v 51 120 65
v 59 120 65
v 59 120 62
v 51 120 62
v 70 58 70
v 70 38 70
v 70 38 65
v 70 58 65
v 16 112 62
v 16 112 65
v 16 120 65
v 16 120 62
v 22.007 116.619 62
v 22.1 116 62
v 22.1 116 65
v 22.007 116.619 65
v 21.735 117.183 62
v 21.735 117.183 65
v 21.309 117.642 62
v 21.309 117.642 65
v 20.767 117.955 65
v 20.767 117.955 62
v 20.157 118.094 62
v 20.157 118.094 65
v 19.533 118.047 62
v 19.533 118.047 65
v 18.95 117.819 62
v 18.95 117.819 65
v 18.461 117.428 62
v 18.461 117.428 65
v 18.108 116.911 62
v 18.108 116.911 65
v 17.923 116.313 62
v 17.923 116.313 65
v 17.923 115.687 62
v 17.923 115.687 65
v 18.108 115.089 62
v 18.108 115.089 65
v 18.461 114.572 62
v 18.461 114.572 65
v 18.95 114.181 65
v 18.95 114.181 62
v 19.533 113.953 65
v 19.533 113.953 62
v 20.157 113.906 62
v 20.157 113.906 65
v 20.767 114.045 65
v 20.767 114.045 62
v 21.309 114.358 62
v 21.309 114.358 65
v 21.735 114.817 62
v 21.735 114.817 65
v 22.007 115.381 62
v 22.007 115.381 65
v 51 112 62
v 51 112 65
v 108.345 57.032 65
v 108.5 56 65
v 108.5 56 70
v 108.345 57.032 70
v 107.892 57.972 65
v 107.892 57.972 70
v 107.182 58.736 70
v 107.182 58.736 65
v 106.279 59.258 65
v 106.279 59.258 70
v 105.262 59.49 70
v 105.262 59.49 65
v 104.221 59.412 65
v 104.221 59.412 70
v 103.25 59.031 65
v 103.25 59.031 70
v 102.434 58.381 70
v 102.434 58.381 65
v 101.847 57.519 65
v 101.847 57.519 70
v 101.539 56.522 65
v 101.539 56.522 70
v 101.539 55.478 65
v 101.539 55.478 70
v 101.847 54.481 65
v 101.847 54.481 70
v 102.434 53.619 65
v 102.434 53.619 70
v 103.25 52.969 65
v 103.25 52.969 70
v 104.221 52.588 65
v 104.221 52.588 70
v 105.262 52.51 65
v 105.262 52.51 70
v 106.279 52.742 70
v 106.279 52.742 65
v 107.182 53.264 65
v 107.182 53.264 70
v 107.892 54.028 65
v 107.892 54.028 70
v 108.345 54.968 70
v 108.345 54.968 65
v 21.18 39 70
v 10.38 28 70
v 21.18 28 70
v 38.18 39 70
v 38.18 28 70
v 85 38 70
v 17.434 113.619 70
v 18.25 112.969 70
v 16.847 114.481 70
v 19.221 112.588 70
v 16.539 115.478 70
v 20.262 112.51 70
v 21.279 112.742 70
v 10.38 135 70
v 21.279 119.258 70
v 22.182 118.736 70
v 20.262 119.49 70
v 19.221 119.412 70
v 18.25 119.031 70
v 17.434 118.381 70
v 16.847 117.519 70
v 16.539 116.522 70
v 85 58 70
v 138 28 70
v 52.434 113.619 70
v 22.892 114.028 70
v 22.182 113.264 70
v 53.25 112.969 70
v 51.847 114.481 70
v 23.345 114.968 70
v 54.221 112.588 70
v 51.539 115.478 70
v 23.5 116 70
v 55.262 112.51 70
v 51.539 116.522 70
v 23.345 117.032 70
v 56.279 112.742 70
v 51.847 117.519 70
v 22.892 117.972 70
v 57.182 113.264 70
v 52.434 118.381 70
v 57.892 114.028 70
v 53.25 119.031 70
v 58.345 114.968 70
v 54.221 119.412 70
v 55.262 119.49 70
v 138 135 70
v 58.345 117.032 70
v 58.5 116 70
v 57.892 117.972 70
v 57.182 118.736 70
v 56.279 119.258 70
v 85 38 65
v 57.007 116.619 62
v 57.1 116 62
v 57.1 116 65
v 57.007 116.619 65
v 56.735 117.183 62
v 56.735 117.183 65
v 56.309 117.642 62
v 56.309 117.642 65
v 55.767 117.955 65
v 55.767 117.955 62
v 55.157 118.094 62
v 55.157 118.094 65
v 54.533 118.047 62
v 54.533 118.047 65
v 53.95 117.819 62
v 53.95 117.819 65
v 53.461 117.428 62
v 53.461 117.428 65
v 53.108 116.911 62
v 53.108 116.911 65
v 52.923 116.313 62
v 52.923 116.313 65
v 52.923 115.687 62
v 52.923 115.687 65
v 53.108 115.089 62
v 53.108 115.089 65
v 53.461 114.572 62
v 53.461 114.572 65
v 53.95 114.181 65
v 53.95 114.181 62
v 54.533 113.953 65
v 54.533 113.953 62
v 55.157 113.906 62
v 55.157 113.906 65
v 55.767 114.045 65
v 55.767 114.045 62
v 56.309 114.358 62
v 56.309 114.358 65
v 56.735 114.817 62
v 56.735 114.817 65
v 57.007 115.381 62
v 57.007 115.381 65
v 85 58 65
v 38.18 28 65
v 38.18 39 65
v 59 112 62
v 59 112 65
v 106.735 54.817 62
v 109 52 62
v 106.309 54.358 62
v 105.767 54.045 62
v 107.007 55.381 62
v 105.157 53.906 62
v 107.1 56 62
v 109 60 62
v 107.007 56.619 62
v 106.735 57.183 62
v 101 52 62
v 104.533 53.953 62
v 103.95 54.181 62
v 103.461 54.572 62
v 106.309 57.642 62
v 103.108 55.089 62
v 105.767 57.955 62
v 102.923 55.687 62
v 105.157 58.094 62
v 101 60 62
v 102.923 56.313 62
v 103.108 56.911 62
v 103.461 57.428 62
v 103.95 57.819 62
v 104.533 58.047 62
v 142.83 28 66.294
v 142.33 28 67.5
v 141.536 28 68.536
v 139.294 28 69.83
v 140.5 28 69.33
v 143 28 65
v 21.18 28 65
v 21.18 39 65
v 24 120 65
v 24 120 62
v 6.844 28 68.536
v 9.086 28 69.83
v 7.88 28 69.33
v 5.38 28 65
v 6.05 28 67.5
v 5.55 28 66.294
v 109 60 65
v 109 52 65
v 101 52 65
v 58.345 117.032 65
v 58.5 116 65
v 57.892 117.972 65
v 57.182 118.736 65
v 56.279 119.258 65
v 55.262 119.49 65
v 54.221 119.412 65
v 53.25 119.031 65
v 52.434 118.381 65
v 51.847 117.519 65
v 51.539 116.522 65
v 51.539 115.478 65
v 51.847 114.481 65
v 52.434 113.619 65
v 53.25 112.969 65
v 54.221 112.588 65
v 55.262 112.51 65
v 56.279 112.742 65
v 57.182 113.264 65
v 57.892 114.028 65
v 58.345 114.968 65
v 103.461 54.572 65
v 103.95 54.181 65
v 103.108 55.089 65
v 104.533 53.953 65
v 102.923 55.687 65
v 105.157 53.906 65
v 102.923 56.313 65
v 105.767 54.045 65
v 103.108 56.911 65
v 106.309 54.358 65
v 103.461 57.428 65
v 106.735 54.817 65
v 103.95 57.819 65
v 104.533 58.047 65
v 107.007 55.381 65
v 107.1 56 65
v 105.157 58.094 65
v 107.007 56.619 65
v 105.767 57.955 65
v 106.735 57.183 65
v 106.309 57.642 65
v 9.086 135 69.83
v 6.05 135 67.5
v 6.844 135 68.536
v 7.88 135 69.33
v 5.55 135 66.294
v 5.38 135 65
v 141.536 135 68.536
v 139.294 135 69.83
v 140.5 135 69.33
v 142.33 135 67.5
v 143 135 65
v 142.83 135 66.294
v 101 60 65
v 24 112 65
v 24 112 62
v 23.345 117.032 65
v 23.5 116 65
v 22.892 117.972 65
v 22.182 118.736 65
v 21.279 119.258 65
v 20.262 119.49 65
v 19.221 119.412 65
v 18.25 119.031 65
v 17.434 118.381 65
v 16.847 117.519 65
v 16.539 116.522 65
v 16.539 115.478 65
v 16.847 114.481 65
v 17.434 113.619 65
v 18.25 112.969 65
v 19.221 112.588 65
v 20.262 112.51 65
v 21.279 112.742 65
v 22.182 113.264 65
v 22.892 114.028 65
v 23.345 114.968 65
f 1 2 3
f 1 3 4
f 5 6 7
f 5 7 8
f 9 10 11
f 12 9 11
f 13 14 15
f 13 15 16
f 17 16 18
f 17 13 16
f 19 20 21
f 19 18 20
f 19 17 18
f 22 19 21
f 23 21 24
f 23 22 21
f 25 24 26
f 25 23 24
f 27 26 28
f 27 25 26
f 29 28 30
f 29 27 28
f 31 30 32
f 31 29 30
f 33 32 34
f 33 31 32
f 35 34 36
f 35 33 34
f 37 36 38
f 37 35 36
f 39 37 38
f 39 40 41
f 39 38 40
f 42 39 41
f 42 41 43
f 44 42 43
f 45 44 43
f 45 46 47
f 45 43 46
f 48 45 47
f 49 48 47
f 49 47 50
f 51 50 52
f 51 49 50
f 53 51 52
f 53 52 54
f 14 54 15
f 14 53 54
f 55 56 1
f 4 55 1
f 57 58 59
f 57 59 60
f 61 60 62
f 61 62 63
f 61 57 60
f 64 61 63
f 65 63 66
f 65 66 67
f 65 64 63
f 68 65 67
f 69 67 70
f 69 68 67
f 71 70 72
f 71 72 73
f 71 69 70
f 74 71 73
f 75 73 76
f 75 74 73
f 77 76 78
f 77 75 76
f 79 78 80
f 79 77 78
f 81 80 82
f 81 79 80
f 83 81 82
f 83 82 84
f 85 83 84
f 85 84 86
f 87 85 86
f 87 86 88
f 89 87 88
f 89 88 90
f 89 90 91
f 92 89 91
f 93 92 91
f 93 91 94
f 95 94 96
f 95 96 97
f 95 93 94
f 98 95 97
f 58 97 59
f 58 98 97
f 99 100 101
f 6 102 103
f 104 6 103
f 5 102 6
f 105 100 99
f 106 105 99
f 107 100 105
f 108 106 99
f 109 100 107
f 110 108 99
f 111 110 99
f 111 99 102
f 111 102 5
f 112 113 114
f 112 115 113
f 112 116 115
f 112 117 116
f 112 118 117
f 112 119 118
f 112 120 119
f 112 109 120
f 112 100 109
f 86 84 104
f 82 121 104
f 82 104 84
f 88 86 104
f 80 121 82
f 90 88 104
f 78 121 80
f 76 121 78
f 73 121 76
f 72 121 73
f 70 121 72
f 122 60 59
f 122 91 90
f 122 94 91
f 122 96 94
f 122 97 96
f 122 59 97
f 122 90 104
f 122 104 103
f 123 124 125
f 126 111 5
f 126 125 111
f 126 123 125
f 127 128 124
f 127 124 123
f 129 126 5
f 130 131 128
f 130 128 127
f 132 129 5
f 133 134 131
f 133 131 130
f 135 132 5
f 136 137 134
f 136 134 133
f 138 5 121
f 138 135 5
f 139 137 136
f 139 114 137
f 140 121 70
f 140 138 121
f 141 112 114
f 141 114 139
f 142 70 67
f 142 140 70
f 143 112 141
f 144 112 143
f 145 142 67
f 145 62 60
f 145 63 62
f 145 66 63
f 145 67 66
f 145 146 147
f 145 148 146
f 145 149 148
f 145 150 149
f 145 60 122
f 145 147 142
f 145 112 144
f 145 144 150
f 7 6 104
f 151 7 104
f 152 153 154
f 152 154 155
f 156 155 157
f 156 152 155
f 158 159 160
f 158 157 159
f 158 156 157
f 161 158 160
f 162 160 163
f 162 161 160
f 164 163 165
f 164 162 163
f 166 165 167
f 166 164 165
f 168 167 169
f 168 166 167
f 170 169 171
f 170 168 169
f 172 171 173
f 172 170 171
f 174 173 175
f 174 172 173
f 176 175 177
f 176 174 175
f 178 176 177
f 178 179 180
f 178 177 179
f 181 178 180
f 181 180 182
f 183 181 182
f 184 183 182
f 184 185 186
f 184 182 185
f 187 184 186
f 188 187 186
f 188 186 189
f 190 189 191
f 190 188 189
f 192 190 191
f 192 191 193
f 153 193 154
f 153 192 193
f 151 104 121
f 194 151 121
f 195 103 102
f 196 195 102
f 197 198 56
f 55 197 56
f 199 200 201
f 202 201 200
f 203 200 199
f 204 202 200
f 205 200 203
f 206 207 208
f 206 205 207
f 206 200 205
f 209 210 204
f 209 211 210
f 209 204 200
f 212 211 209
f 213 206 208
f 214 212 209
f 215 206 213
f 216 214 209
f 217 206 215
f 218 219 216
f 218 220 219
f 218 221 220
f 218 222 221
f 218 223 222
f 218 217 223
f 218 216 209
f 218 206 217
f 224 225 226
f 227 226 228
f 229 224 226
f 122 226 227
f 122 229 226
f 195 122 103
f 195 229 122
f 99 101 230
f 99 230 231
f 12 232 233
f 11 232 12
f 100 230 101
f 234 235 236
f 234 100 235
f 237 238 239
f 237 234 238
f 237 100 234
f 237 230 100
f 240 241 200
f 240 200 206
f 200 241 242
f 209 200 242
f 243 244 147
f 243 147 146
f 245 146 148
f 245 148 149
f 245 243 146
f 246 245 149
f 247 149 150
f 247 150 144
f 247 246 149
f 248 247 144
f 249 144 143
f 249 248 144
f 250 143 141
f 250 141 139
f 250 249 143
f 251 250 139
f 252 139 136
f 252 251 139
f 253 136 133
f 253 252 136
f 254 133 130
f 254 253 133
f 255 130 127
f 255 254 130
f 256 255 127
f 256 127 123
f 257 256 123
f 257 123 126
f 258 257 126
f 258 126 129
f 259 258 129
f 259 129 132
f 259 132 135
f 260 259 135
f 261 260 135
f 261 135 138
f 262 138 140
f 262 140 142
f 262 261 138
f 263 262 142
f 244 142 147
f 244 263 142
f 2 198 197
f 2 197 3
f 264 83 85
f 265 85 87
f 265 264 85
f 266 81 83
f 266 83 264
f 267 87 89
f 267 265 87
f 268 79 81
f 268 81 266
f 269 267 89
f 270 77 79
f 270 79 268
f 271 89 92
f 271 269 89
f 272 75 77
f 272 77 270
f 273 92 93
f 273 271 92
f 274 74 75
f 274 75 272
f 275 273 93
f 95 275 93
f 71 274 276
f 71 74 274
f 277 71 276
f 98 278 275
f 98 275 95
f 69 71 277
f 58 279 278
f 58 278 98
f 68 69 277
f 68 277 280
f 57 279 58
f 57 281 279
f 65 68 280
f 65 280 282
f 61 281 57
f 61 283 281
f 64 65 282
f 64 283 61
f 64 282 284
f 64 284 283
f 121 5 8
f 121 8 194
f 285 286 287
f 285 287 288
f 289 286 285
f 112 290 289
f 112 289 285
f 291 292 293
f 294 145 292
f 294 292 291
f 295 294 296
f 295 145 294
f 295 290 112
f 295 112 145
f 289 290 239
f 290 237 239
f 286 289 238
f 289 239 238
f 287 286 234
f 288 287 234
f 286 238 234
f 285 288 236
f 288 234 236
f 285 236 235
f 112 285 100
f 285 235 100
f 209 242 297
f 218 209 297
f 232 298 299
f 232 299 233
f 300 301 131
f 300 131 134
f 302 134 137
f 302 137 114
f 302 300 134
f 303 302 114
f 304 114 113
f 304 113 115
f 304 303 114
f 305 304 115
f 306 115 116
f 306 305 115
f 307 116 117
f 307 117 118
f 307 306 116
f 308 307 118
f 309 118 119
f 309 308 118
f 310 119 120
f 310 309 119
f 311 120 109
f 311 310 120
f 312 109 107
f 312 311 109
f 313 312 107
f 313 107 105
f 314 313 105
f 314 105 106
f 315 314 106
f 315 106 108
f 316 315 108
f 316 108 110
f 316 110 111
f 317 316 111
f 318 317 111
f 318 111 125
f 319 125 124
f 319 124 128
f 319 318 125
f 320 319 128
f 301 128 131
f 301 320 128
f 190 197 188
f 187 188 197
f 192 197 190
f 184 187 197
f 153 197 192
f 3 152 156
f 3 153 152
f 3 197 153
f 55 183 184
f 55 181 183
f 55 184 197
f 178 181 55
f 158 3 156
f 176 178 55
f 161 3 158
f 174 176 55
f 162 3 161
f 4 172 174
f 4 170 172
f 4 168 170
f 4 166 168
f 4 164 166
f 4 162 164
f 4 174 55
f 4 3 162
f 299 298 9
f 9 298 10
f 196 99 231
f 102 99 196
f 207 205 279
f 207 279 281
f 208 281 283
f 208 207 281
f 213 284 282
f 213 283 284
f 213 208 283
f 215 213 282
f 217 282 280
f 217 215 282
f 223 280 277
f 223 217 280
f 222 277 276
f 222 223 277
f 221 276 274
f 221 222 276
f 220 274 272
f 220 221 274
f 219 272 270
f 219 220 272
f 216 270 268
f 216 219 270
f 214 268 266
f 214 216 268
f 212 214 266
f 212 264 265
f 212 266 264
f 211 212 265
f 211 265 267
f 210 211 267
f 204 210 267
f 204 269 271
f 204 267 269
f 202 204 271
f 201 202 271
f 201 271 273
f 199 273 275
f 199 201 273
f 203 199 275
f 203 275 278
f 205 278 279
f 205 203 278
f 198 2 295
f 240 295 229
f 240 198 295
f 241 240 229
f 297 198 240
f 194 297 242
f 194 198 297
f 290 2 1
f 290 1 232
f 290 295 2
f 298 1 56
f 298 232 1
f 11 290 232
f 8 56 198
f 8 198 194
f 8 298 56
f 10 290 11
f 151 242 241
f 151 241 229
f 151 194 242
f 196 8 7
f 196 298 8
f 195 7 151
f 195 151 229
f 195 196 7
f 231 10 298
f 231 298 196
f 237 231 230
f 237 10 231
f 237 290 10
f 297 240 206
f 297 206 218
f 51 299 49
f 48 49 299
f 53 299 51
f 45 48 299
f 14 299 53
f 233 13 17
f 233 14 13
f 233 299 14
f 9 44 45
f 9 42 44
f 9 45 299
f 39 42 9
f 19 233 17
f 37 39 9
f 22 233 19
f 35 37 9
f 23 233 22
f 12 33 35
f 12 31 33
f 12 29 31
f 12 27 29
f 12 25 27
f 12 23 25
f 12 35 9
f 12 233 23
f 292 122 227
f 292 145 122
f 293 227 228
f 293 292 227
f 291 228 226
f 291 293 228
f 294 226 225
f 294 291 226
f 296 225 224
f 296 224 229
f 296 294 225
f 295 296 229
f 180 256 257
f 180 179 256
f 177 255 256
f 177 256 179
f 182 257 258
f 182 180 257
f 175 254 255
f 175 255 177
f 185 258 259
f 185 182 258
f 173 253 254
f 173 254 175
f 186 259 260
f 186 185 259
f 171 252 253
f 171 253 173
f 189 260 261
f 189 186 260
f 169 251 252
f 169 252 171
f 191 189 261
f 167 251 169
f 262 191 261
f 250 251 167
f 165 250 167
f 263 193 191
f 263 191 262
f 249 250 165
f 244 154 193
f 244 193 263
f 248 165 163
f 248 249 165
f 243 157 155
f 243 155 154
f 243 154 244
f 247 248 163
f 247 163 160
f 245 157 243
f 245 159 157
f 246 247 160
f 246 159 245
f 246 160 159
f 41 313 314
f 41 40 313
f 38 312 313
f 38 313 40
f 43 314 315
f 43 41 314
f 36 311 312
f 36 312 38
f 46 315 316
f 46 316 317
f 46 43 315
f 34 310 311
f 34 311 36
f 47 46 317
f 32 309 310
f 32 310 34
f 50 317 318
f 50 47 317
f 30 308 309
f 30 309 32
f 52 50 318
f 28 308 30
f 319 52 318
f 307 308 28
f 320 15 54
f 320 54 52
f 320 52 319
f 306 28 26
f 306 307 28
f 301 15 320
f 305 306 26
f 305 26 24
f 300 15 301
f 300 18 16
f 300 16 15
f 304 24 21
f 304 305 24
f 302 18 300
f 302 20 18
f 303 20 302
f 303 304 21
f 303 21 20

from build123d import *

# Parameters (mm, degrees)
SKETCH1_W                = 150
SKETCH1_H                = 135
SKETCH1_R                = 2.1
BOSS_EXTRUDE2_DEPTH      = 70
SKETCH13_W               = 166.167800453
SKETCH13_H               = 148.934240363
CUT_EXTRUDE1_DEPTH       = 60
SKETCH17_W               = 17
SKETCH17_H               = 11
SKETCH17_W_2             = 15
SKETCH17_H_2             = 20
CUT_EXTRUDE5_DEPTH       = 10
CUT_EXTRUDE6_DEPTH       = 203.051973512
CUT_EXTRUDE6_DEPTH_BACK  = 203.051973512
SKETCH18_W               = 150
SKETCH18_H               = 135
CUT_EXTRUDE7_DEPTH       = 206.095744471
CUT_EXTRUDE7_DEPTH_BACK  = 206.095744471
FILLET1_R                = 5
SKETCH20_W               = 8
SKETCH20_H               = 8
BOSS_EXTRUDE3_DEPTH      = 3
CUT_EXTRUDE9_START       = -5
SKETCH21_R               = 3.5
SKETCH21_R_2             = 2.1
CUT_EXTRUDE9_DEPTH       = 5
CUT_EXTRUDE10_DEPTH      = 197.81971446
CUT_EXTRUDE10_DEPTH_BACK = 197.81971446
SKETCH21_2_R             = 2.1


with BuildPart() as part:
    # Sketch1 → Boss-Extrude2 (new body)
    with BuildSketch(Plane.XY):
        with Locations((75, 67.5)):
            Rectangle(SKETCH1_W, SKETCH1_H)
        with Locations((20, 116)):
            Circle(SKETCH1_R, mode=Mode.SUBTRACT)
        with Locations((55, 116)):
            Circle(SKETCH1_R, mode=Mode.SUBTRACT)
        with Locations((105, 56)):
            Circle(SKETCH1_R, mode=Mode.SUBTRACT)
    extrude(amount=BOSS_EXTRUDE2_DEPTH)

    # Sketch13 → Cut-Extrude1 (cut)
    with BuildSketch(Plane(origin=(0, 0, 0), x_dir=(-1, 0, 0), z_dir=(0, 0, -1))):
        with Locations((-76.451247165, 67.95351474)):
            Rectangle(SKETCH13_W, SKETCH13_H)
    extrude(amount=-CUT_EXTRUDE1_DEPTH, mode=Mode.SUBTRACT)

    # Sketch17 → Cut-Extrude5 (cut)
    with BuildSketch(Plane.XY.offset(70)):
        with Locations((29.68, 33.5)):
            Rectangle(SKETCH17_W, SKETCH17_H)
        with Locations((77.5, 48)):
            Rectangle(SKETCH17_W_2, SKETCH17_H_2)
    extrude(amount=-CUT_EXTRUDE5_DEPTH, mode=Mode.SUBTRACT)

    # Sketch18 → Cut-Extrude6 (cut, two sides: drawn at the far end of the back side and taken through both)
    # profile 1 of 2: a face of its own
    with BuildSketch(Plane.XY.offset(70).offset(-CUT_EXTRUDE6_DEPTH_BACK)):
        Polygon((-16.428571429, -29.414285714), (-20.085714286, 157.1), (193.857142857, 157.1), (193.857142857, -29.414285714), align=None)
        with Locations((75, 67.5)):
            Rectangle(SKETCH18_W, SKETCH18_H, mode=Mode.SUBTRACT)
    # profile 2 of 2: a face of its own
    with BuildSketch(Plane.XY.offset(70).offset(-CUT_EXTRUDE6_DEPTH_BACK)):
        Polygon((143, 28), (5.38, 28), (5.38, 135), (0, 135), (0, 0), (150, 0), (150, 135), (143, 135), align=None)
    extrude(amount=CUT_EXTRUDE6_DEPTH + CUT_EXTRUDE6_DEPTH_BACK, mode=Mode.SUBTRACT)

    # Sketch19 → Cut-Extrude7 (cut, two sides: drawn at the far end of the back side and taken through both)
    with BuildSketch(Plane(origin=(143, 0, 0), x_dir=(0, 0, -1), z_dir=(1, 0, 0)).offset(-CUT_EXTRUDE7_DEPTH_BACK)):
        Polygon((-65, 138.622751323), (-65, 12.247752415), (-38.78181863, -5.10096745), (-31.852947011, 142.632473856), align=None)
    extrude(amount=CUT_EXTRUDE7_DEPTH + CUT_EXTRUDE7_DEPTH_BACK, mode=Mode.SUBTRACT)

    # Fillet1
    fillet1_edges = [part.edges().sort_by_distance(p)[0] for p in [
        (5.38, 81.5, 70),
        (143, 81.5, 70),
    ]]
    fillet(fillet1_edges, radius=FILLET1_R - 0.0001)  # a hair under: the kernel refuses the full size

    # Sketch20 → Boss-Extrude3 (add)
    with BuildSketch(Plane(origin=(0, 0, 65), x_dir=(-1, 0, 0), z_dir=(0, 0, -1))):
        with Locations((-55, 116)):
            Rectangle(SKETCH20_W, SKETCH20_H)
        with Locations((-20, 116)):
            Rectangle(SKETCH20_W, SKETCH20_H)
        with Locations((-105, 56)):
            Rectangle(SKETCH20_W, SKETCH20_H)
    extrude(amount=BOSS_EXTRUDE3_DEPTH)

    # Sketch21 → Cut-Extrude9 (cut)
    # profile 1 of 3: a face of its own
    with BuildSketch(Plane.XY.offset(70).offset(CUT_EXTRUDE9_START)):
        with Locations((20, 116)):
            Circle(SKETCH21_R)
        with Locations((20, 116)):
            Circle(SKETCH21_R_2, mode=Mode.SUBTRACT)
    # profile 2 of 3: a face of its own
    with BuildSketch(Plane.XY.offset(70).offset(CUT_EXTRUDE9_START)):
        with Locations((55, 116)):
            Circle(SKETCH21_R)
        with Locations((55, 116)):
            Circle(SKETCH21_R_2, mode=Mode.SUBTRACT)
    # profile 3 of 3: a face of its own
    with BuildSketch(Plane.XY.offset(70).offset(CUT_EXTRUDE9_START)):
        with Locations((105, 56)):
            Circle(SKETCH21_R)
        with Locations((105, 56)):
            Circle(SKETCH21_R_2, mode=Mode.SUBTRACT)
    extrude(amount=CUT_EXTRUDE9_DEPTH, mode=Mode.SUBTRACT)

    # Sketch21<2> → Cut-Extrude10 (cut, two sides: drawn at the far end of the back side and taken through both)
    with BuildSketch(Plane.XY.offset(70).offset(-CUT_EXTRUDE10_DEPTH_BACK)):
        with Locations((20, 116)):
            Circle(SKETCH21_2_R)
        with Locations((55, 116)):
            Circle(SKETCH21_2_R)
        with Locations((105, 56)):
            Circle(SKETCH21_2_R)
    extrude(amount=CUT_EXTRUDE10_DEPTH + CUT_EXTRUDE10_DEPTH_BACK, mode=Mode.SUBTRACT)


solid = part.part
